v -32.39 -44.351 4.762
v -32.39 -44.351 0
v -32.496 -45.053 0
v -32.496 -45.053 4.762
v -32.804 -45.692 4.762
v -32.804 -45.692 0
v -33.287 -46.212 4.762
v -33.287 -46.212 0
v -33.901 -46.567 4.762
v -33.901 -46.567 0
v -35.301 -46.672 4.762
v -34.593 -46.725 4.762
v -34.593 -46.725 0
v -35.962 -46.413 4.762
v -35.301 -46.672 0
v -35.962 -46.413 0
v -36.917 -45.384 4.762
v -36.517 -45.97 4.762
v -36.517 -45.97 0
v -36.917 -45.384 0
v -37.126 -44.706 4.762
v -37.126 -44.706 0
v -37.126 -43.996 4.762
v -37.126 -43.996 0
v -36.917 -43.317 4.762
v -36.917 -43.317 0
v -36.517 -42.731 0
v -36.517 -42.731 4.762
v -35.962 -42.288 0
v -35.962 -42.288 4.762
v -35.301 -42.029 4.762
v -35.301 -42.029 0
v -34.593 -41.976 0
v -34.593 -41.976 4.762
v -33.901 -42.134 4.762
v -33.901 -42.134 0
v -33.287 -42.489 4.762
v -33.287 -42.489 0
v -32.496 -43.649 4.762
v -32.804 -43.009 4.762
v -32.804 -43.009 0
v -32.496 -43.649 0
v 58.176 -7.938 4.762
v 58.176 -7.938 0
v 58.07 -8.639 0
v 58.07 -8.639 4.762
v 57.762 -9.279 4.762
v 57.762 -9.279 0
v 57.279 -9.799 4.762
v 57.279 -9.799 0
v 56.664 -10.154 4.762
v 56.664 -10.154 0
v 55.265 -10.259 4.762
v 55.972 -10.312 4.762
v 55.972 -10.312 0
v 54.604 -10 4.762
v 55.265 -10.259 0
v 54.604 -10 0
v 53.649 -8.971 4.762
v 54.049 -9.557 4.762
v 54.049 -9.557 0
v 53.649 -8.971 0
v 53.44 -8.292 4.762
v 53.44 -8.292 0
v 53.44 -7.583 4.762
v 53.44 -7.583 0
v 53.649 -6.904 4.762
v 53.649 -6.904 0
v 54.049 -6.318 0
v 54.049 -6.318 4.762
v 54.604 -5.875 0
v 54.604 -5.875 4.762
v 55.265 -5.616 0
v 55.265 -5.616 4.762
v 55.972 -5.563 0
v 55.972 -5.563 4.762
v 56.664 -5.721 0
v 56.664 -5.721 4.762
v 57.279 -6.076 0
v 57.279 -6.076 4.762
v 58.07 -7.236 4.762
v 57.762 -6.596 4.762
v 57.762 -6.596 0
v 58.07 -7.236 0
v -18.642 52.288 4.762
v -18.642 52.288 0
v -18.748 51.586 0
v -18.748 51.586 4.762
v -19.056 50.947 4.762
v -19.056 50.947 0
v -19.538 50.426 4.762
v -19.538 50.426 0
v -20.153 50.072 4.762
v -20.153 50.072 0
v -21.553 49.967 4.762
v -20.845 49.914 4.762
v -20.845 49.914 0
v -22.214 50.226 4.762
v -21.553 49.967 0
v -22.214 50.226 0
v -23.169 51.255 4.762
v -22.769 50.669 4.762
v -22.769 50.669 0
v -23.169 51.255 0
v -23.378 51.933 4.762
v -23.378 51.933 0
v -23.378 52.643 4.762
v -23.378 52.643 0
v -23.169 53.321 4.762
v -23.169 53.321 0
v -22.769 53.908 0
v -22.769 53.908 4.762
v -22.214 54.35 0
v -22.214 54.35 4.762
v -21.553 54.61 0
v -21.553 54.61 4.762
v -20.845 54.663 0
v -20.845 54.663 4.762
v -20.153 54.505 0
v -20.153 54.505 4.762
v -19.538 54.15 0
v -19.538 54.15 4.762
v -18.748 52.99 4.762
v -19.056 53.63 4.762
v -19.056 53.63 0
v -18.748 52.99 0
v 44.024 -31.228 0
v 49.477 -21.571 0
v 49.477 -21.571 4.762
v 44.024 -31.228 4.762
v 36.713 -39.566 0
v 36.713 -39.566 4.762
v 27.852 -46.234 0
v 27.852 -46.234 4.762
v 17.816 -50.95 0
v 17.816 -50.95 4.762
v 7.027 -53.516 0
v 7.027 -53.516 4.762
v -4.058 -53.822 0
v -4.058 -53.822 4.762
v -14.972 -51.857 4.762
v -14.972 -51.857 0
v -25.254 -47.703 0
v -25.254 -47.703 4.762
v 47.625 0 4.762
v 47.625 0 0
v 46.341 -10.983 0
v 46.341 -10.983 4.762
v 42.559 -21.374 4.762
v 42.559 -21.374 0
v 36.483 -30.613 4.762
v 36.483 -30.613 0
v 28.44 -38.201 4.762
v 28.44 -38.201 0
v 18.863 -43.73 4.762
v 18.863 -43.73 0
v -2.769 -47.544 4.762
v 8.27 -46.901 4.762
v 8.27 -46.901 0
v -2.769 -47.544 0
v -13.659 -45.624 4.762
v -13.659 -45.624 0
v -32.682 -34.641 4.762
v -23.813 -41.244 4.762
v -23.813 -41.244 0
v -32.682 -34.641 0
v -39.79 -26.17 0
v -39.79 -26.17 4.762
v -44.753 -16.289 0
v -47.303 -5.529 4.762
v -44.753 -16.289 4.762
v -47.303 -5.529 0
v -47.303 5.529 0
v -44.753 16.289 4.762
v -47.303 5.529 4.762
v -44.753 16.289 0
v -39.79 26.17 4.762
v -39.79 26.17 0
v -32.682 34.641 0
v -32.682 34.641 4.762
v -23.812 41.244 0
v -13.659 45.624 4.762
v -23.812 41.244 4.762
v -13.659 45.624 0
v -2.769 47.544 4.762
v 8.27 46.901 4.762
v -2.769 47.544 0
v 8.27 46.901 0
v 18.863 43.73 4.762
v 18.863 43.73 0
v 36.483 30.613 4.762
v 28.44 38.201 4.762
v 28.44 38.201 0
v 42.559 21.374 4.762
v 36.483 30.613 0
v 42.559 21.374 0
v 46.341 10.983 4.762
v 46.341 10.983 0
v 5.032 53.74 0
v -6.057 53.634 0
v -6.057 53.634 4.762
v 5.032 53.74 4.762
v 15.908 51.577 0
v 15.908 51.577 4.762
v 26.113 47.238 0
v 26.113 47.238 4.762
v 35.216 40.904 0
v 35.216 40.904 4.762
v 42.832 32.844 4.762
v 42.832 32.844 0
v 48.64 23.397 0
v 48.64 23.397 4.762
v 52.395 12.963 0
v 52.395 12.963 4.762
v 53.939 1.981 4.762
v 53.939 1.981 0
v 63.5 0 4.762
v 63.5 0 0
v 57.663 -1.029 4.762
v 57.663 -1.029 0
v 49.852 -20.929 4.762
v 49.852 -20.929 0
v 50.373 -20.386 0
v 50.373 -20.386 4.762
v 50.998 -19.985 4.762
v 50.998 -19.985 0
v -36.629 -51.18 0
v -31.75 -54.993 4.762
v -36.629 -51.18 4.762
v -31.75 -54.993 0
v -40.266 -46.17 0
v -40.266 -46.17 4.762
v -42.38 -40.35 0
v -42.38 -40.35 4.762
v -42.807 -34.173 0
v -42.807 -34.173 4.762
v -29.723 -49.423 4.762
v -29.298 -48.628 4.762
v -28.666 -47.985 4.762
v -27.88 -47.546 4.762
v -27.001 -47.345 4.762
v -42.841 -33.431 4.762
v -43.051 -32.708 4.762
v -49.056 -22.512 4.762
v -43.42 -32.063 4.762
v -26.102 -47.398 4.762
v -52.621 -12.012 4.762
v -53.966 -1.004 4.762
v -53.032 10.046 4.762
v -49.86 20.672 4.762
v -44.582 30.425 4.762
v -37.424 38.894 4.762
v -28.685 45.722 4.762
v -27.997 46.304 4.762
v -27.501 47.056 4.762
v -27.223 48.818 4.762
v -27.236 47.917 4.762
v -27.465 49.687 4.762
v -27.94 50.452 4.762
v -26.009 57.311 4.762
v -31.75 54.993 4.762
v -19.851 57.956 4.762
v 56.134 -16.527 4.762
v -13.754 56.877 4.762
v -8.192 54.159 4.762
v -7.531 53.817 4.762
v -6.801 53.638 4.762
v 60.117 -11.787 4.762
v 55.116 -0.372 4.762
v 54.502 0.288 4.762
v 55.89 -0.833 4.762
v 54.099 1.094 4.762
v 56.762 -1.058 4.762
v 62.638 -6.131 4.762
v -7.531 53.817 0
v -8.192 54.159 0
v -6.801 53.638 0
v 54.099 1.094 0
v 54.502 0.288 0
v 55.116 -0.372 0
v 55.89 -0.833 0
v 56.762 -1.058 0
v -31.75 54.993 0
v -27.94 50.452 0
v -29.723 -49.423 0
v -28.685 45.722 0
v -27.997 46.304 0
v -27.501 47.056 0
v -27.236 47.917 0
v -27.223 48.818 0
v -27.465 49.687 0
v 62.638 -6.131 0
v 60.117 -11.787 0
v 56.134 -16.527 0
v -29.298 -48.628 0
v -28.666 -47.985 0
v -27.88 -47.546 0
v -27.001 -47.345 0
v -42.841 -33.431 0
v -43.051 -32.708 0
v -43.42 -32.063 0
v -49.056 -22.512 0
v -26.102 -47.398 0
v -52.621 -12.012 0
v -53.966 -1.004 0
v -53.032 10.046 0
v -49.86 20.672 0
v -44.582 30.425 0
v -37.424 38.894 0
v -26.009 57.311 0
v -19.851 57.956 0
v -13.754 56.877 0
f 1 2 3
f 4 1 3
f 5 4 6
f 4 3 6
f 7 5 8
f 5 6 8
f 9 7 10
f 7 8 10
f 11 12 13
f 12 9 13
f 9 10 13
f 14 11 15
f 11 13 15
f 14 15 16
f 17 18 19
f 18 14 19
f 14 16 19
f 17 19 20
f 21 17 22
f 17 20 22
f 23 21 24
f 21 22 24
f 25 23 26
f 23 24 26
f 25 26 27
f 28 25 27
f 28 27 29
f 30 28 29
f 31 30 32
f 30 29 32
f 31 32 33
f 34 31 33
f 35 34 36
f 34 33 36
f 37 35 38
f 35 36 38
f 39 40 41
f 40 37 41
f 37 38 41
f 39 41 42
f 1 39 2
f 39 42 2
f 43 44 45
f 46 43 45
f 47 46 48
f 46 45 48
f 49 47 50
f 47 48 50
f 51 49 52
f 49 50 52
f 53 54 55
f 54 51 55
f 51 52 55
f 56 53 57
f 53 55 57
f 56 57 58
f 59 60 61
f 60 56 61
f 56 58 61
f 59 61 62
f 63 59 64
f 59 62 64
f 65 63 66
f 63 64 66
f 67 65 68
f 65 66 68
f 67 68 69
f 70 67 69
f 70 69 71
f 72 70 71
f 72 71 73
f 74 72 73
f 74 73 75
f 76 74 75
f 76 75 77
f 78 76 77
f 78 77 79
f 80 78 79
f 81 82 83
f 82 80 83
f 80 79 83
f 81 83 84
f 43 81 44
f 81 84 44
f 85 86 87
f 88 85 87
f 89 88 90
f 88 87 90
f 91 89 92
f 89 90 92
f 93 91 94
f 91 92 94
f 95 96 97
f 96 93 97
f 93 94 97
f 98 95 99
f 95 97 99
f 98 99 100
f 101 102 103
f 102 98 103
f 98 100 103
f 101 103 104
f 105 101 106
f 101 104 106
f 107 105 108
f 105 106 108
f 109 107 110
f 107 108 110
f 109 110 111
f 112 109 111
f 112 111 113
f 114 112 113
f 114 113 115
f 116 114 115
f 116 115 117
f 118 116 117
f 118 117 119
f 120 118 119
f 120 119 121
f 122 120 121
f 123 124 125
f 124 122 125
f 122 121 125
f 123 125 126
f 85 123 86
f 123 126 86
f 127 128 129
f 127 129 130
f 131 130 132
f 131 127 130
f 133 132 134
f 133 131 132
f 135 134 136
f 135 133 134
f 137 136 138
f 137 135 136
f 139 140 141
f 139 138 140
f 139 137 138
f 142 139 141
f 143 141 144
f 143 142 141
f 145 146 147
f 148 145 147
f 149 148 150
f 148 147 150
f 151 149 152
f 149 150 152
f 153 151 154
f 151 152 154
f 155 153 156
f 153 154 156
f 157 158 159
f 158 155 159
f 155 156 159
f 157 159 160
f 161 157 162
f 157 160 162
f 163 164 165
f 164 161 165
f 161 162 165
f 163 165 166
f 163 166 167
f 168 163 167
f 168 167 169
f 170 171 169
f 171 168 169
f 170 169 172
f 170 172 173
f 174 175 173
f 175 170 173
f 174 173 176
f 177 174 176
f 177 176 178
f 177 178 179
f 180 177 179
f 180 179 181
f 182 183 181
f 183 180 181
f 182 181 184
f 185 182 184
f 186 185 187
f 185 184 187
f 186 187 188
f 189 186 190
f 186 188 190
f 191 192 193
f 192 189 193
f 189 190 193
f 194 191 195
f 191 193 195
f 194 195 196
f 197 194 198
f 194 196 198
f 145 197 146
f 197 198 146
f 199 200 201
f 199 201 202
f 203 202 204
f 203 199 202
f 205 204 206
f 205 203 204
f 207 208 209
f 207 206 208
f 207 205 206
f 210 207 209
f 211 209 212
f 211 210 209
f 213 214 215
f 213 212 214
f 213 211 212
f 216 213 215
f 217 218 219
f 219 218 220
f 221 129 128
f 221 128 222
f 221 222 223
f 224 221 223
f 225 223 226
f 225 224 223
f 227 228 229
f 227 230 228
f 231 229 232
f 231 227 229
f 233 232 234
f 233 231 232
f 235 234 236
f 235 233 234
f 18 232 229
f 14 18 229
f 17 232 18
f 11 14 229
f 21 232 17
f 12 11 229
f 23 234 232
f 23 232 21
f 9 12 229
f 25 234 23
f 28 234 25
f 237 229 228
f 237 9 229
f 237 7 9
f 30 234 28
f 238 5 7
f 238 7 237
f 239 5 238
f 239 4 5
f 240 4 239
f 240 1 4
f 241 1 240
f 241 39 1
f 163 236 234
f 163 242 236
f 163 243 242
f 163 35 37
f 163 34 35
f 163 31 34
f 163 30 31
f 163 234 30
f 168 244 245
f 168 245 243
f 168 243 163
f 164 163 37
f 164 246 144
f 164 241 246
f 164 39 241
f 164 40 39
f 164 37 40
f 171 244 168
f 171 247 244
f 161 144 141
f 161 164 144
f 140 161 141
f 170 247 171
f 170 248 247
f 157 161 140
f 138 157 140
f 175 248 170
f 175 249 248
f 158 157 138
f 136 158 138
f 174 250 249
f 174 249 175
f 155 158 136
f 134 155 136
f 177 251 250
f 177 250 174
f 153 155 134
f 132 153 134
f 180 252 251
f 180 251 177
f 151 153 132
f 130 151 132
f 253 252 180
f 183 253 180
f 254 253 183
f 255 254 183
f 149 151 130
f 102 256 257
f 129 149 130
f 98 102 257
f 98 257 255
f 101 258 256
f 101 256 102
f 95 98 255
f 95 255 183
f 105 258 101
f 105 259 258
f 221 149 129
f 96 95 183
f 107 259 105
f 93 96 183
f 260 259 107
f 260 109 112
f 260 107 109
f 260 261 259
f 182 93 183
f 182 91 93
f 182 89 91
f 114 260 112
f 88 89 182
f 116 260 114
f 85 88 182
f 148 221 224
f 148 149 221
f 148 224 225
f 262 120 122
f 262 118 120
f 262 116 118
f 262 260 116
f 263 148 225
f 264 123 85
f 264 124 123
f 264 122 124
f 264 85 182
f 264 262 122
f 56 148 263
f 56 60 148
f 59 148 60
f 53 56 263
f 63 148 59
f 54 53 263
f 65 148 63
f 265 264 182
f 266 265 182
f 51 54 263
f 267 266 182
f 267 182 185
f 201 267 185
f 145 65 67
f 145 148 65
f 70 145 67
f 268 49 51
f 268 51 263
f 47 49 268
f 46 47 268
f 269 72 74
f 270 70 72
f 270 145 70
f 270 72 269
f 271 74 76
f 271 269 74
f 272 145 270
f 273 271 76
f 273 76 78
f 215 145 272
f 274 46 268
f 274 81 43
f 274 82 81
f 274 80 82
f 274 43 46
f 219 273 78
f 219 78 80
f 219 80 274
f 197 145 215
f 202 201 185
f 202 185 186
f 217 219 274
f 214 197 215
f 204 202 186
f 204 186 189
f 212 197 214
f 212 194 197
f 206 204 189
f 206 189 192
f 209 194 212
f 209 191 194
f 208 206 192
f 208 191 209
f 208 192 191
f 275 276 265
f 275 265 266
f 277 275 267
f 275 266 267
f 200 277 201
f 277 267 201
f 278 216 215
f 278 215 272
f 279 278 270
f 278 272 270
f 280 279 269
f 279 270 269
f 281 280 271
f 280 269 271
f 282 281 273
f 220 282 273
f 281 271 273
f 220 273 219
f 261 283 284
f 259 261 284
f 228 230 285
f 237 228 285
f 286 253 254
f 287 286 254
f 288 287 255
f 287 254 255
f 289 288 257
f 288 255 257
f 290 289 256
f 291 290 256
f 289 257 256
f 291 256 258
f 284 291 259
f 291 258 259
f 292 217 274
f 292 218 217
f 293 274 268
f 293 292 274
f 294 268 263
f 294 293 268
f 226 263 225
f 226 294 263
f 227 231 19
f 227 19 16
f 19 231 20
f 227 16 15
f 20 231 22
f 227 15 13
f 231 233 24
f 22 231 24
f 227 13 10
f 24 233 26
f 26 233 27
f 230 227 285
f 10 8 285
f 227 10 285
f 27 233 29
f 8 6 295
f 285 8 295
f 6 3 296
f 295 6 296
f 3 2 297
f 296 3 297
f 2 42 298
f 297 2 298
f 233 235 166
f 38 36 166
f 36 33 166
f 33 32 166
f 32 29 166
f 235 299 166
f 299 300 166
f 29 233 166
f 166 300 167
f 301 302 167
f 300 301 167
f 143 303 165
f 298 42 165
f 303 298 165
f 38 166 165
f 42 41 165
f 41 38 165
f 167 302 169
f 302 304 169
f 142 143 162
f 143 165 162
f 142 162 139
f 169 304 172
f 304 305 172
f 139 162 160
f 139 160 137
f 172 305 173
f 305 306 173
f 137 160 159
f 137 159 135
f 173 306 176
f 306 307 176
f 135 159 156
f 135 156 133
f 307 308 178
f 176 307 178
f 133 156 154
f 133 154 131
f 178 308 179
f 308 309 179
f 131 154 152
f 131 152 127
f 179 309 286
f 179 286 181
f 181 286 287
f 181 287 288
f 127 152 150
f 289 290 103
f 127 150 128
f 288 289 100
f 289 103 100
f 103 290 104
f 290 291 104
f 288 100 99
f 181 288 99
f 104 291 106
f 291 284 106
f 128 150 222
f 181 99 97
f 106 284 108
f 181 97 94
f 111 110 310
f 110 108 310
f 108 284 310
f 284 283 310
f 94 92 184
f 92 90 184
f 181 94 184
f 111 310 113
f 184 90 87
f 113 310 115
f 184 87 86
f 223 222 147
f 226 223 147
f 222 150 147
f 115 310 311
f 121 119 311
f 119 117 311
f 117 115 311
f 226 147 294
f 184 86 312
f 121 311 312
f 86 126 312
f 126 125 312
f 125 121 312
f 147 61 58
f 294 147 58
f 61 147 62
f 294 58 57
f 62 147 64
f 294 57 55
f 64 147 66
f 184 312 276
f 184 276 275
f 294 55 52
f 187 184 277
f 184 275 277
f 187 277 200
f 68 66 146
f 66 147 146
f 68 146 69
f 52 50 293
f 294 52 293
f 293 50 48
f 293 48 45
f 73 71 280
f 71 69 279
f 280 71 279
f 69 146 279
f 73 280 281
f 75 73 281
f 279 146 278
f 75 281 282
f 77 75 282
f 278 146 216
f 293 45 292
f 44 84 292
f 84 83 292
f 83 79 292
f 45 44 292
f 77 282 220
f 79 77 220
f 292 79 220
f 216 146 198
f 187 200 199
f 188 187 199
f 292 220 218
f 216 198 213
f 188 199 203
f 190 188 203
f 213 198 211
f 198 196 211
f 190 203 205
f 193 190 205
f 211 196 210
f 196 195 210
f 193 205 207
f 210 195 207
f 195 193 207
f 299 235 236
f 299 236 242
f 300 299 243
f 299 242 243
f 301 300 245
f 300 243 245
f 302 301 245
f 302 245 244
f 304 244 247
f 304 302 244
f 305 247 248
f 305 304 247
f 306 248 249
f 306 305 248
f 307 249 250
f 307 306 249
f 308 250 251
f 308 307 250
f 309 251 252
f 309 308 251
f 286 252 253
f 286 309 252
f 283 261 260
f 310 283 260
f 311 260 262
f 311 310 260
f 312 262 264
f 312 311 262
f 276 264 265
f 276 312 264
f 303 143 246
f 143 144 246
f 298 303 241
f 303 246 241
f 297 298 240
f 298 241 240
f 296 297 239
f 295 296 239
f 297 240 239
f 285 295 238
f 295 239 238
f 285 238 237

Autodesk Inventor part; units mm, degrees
ref_plane "YZ Plane" through (0, 0, 0) normal (1, 0, 0) x (0, 1, 0)
ref_plane "XZ Plane" through (0, 0, 0) normal (0, 1, 0) x (-1, 0, 0)
ref_plane "XY Plane" through (0, 0, 0) normal (0, 0, 1) x (1, 0, 0)
sketch "Sketch1" plane through (0, 0, 0) normal (0, 0, 1) x (1, 0, 0)
  circle A0 centre (0, 0) radius 63.5 construction
  circle A1 centre (0, 0) radius 47.625
  circle A2 centre (0, 0) radius 53.975
  line L0 (0, 0) -> (63.5, 0) construction
  line L1 (63.5, 0) -> (53.948719, -1.684149)
  arc A3 (49.945192, -20.464076) -> (63.5, 0) centre (41.275, 0) ccw
  line L2 (-31.75, 54.992613) -> (-25.515844, 47.563035)
  arc A4 (-7.250187, 53.485843) -> (-31.75, 54.992613) centre (-20.6375, 35.745199) ccw
  line L3 (-31.75, -54.992613) -> (-28.432875, -45.878887)
  arc A5 (-42.695005, -33.021768) -> (-31.75, -54.992613) centre (-20.6375, -35.745199) ccw
  circle A6 centre (25.4, 0) radius 22.225
  circle A7 centre (-11.250284, 22.225) radius 20.6375
  circle A8 centre (-11.250284, 22.225) radius 7.9375
  circle A9 centre (-39.6875, 0) radius 7.9375
  circle A10 centre (19.84375, -34.370383) radius 7.9375
  circle A11 centre (19.84375, 34.370383) radius 7.9375
  circle A12 centre (25.4, 0) radius 2
  circle A13 centre (-11.250284, -22.225) radius 20.6375
  circle A14 centre (-11.250284, -22.225) radius 7.9375
  circle A15 centre (55.794471, -7.9375) radius 2.38125
  circle A16 centre (-21.023159, 52.288179) radius 2.38125
  circle A17 centre (-34.771312, -44.350679) radius 2.38125
  point P0 (-7.250187, 53.485843)
  point P1 (-25.515844, 47.563035)
  point P2 (-42.695005, -33.021768)
  point P3 (-28.432875, -45.878887)
  dimension "Ring_OD" = 127
  dimension "d2" = 6.35
  dimension "d3" = 9.525
  dimension "d15" = 10
  dimension "d16" = 22.225
  dimension "d19" = 360
  dimension "Pulley_OD" = 44.45
  dimension "Brass_OD" = 41.275
  dimension "d41" = 15.875
  dimension "Brass_Offset" = 22.225
  dimension "d43" = 15.875
  dimension "d46" = 360
  dimension "d48" = 4
  dimension "d50" = 4.7625
  dimension "d51" = 7.9375
  dimension "d54" = 360
  dimension "Ring_ID" = 95.25
sketch "Sketch1 outline for Extrusion1" plane through (0, 0, 0) normal (0, 0, 1) x (1, 0, 0)
  arc A0 (49.945192, -20.464076) -> (63.5, 0) centre (41.275, 0) ccw
  arc A1 (-28.432875, -45.878887) -> (49.945192, -20.464076) centre (0, 0) ccw
  line L0 (63.5, 0) -> (53.948719, -1.684149)
  line L1 (-31.75, -54.992613) -> (-28.432875, -45.878887)
  arc A2 (53.948719, -1.684149) -> (-7.250187, 53.485843) centre (0, 0) ccw
  arc A3 (-42.695005, -33.021768) -> (-31.75, -54.992613) centre (-20.6375, -35.745199) ccw
  arc A4 (-7.250187, 53.485843) -> (-31.75, 54.992613) centre (-20.6375, 35.745199) ccw
  arc A5 (-25.515844, 47.563035) -> (-42.695005, -33.021768) centre (0, 0) ccw
  line L2 (-31.75, 54.992613) -> (-25.515844, 47.563035)
  circle A6 centre (-34.771312, -44.350679) radius 2.38125
  circle A7 centre (0, 0) radius 47.625
  circle A8 centre (55.794471, -7.9375) radius 2.38125
  circle A9 centre (-21.023159, 52.288179) radius 2.38125
extrude "Extrusion1" add sketch "Sketch1 outline for Extrusion1" along normal blind 4.7625
fillet "Fillet1" radius 3.175 6 edges at (-7.2502, 53.4858, 2.3813) (-25.5158, 47.563, 2.3813) (53.9487, -1.6841, 2.3813) (49.9452, -20.4641, 2.3813) (-28.4329, -45.8789, 2.3813) (-42.695, -33.0218, 2.3813)
properties part number "Ring Vert Test" material "Steel, Alloy"
